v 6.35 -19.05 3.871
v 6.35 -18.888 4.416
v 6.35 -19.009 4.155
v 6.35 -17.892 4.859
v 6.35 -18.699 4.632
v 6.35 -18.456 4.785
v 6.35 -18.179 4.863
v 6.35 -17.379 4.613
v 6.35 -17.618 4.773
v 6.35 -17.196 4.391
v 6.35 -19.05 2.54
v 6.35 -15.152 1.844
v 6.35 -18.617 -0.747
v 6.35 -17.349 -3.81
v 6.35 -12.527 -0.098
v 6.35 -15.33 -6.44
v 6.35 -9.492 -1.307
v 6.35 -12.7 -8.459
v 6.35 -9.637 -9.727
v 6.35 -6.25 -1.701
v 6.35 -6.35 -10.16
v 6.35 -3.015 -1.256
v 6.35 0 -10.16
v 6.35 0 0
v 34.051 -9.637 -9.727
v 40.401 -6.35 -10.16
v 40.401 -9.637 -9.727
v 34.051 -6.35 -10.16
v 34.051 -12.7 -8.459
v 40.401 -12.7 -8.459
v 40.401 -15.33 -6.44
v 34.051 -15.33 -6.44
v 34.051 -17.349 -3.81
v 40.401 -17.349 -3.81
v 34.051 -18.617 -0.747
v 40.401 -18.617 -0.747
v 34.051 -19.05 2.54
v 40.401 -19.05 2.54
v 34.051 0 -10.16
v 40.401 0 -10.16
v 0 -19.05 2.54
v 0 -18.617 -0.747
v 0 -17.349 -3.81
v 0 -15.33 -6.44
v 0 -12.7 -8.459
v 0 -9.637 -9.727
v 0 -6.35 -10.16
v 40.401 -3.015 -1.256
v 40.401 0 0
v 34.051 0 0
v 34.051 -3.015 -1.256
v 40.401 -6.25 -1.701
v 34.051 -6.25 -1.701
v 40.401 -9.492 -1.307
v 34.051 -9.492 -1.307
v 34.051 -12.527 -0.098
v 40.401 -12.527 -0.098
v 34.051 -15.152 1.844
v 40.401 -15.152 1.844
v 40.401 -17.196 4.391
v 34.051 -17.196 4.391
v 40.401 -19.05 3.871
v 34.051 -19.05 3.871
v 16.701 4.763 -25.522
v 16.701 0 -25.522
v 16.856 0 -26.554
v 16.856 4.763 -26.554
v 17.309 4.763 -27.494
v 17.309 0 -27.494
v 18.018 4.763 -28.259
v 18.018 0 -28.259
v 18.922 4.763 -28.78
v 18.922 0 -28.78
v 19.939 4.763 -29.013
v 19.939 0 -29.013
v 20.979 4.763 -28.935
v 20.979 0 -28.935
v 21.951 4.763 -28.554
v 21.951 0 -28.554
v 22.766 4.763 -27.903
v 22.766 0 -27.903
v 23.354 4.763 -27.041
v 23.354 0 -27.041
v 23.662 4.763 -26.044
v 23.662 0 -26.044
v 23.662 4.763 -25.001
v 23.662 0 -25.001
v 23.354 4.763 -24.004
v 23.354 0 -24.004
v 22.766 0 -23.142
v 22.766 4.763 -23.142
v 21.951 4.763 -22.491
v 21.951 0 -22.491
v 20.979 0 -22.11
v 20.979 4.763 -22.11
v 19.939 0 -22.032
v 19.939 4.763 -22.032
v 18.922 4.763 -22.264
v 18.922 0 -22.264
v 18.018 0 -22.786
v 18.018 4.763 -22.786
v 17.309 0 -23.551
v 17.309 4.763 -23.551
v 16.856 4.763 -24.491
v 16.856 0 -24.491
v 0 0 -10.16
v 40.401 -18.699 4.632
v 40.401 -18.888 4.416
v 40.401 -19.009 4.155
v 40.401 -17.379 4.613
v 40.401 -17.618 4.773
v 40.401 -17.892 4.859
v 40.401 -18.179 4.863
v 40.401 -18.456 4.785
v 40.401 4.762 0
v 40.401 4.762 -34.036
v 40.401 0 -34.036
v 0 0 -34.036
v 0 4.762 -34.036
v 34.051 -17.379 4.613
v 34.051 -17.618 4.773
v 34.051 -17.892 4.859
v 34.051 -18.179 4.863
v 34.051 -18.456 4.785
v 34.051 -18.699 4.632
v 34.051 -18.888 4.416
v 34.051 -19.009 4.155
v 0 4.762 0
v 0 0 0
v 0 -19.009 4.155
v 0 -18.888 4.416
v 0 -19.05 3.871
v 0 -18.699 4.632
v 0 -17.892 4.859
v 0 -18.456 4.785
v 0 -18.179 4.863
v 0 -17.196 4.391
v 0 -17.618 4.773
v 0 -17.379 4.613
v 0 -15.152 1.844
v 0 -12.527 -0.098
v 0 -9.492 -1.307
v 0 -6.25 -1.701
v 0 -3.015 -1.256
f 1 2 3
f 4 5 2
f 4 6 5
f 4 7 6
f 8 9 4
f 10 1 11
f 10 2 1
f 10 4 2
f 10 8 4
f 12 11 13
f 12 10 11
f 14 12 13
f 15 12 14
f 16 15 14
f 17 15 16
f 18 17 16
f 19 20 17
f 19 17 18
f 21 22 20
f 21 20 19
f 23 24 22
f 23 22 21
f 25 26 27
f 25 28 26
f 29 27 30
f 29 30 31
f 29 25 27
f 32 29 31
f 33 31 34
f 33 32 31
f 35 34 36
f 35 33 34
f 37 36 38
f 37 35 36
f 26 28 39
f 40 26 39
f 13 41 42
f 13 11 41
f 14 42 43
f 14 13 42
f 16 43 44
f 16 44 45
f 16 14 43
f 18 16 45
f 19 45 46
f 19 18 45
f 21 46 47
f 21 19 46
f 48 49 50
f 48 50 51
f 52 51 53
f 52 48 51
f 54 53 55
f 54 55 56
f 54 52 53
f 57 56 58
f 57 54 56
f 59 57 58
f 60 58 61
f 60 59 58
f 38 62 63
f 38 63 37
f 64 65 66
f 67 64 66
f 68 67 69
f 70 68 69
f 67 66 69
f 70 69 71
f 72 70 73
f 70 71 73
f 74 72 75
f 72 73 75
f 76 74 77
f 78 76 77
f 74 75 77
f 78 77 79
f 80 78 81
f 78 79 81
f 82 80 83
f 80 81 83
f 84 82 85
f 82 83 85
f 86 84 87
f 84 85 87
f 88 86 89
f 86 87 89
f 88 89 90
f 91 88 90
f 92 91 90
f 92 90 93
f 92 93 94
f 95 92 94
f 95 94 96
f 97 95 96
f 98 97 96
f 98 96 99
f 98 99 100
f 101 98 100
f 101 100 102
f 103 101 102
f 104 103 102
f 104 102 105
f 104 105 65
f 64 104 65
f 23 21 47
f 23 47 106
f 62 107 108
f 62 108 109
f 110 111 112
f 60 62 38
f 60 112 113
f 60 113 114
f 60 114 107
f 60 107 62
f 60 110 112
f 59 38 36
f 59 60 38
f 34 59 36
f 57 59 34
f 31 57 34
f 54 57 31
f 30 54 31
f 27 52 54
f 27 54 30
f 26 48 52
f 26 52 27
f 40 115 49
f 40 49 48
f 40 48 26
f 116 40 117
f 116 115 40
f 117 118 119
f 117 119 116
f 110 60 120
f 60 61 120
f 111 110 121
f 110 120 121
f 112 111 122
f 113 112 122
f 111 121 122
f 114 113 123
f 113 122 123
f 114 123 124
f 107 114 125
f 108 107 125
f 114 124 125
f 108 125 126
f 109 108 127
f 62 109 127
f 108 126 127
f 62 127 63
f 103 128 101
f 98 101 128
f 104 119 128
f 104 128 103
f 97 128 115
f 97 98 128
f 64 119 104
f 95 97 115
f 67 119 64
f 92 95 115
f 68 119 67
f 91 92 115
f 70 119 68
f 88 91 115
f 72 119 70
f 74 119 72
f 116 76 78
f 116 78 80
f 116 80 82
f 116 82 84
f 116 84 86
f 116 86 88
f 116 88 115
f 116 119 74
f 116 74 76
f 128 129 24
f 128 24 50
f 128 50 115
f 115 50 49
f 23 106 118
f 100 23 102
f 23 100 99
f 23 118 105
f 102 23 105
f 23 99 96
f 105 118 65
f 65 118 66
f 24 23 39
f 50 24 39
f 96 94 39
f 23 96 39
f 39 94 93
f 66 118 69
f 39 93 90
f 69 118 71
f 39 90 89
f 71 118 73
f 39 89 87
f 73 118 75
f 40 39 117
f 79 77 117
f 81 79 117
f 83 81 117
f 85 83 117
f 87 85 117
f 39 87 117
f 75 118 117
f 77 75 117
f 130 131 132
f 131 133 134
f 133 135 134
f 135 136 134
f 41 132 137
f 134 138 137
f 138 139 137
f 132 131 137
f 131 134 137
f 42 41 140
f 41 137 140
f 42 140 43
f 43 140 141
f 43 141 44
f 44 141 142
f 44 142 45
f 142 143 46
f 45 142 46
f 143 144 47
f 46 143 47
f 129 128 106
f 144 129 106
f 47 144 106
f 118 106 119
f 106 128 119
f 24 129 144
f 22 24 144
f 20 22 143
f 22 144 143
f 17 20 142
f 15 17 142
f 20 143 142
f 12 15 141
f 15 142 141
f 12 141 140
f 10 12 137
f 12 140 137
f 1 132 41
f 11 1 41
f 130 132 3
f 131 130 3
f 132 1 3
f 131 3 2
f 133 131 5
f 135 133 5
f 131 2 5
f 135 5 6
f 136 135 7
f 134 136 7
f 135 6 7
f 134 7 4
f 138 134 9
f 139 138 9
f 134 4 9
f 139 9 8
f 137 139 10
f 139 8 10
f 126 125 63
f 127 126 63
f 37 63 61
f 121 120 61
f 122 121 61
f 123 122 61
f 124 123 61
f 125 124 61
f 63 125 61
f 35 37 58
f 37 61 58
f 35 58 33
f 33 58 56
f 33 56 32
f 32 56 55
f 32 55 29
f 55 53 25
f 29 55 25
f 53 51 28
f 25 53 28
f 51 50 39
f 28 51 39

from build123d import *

# Parameters (mm, degrees)
SKETCH1_W            = 40.40124
SKETCH1_H            = 34.036
SKETCH1_R            = 1.257288094
BOSS_EXTRUDE1_DEPTH  = 4.7625
M6_CLEARANCE_HOLE1_D = 7
BOSS_EXTRUDE3_DEPTH  = 6.35
FILLET2_R            = 1
FILLET3_R            = 12.7


with BuildPart() as part:
    # Sketch1 → Boss-Extrude1 (new body)
    with BuildSketch(Plane(origin=(0, 0, 0), x_dir=(1, 0, 0), z_dir=(0, 1, 0))):
        with Locations((20.20062, 17.018)):
            Rectangle(SKETCH1_W, SKETCH1_H)
        with Locations(Location((20.20062, 25.522416525, 0), (0, 0, 90))):
            Circle(SKETCH1_R, mode=Mode.SUBTRACT)
    extrude(amount=BOSS_EXTRUDE1_DEPTH)

    # M6 Clearance Hole1 (through all)
    with Locations(Plane(origin=(0, 4.7625, 0), x_dir=(1, 0, 0), z_dir=(0, 1, 0))):
        with Locations((20.20062, 25.522416525)):
            Hole(M6_CLEARANCE_HOLE1_D / 2)

    # Sketch5 → Boss-Extrude3 (add)
    with BuildSketch(Plane(origin=(40.40124, 0, 0), x_dir=(0, 0, -1), z_dir=(1, 0, 0))):
        with BuildLine():
            Line((-10.998522628, -19.05), (10.16, -19.05))
            Line((10.16, -19.05), (10.16, 0))
            Line((10.16, 0), (0, 0))
            ThreePointArc((0, 0), (0, -12.7), (-10.998522628, -19.05))
        make_face()
    boss_extrude3 = extrude(amount=-BOSS_EXTRUDE3_DEPTH)

    # Mirror1: Boss-Extrude3 across plane
    add(boss_extrude3.mirror(Plane(origin=(20.20062, 0, 0), x_dir=(0, 0, 1), z_dir=(1, 0, 0))))

    # Fillet2
    fillet2_edges = [part.edges().sort_by_distance(p)[0] for p in [
        (37.22624, -19.05, 10.998522628),
        (3.175, -19.05, 10.998522628),
    ]]
    fillet(fillet2_edges, radius=FILLET2_R)

    # Fillet3
    fillet3_edges = [part.edges().sort_by_distance(p)[0] for p in [
        (37.22624, -19.05, -10.16),
        (3.175, -19.05, -10.16),
    ]]
    fillet(fillet3_edges, radius=FILLET3_R)


solid = part.part
